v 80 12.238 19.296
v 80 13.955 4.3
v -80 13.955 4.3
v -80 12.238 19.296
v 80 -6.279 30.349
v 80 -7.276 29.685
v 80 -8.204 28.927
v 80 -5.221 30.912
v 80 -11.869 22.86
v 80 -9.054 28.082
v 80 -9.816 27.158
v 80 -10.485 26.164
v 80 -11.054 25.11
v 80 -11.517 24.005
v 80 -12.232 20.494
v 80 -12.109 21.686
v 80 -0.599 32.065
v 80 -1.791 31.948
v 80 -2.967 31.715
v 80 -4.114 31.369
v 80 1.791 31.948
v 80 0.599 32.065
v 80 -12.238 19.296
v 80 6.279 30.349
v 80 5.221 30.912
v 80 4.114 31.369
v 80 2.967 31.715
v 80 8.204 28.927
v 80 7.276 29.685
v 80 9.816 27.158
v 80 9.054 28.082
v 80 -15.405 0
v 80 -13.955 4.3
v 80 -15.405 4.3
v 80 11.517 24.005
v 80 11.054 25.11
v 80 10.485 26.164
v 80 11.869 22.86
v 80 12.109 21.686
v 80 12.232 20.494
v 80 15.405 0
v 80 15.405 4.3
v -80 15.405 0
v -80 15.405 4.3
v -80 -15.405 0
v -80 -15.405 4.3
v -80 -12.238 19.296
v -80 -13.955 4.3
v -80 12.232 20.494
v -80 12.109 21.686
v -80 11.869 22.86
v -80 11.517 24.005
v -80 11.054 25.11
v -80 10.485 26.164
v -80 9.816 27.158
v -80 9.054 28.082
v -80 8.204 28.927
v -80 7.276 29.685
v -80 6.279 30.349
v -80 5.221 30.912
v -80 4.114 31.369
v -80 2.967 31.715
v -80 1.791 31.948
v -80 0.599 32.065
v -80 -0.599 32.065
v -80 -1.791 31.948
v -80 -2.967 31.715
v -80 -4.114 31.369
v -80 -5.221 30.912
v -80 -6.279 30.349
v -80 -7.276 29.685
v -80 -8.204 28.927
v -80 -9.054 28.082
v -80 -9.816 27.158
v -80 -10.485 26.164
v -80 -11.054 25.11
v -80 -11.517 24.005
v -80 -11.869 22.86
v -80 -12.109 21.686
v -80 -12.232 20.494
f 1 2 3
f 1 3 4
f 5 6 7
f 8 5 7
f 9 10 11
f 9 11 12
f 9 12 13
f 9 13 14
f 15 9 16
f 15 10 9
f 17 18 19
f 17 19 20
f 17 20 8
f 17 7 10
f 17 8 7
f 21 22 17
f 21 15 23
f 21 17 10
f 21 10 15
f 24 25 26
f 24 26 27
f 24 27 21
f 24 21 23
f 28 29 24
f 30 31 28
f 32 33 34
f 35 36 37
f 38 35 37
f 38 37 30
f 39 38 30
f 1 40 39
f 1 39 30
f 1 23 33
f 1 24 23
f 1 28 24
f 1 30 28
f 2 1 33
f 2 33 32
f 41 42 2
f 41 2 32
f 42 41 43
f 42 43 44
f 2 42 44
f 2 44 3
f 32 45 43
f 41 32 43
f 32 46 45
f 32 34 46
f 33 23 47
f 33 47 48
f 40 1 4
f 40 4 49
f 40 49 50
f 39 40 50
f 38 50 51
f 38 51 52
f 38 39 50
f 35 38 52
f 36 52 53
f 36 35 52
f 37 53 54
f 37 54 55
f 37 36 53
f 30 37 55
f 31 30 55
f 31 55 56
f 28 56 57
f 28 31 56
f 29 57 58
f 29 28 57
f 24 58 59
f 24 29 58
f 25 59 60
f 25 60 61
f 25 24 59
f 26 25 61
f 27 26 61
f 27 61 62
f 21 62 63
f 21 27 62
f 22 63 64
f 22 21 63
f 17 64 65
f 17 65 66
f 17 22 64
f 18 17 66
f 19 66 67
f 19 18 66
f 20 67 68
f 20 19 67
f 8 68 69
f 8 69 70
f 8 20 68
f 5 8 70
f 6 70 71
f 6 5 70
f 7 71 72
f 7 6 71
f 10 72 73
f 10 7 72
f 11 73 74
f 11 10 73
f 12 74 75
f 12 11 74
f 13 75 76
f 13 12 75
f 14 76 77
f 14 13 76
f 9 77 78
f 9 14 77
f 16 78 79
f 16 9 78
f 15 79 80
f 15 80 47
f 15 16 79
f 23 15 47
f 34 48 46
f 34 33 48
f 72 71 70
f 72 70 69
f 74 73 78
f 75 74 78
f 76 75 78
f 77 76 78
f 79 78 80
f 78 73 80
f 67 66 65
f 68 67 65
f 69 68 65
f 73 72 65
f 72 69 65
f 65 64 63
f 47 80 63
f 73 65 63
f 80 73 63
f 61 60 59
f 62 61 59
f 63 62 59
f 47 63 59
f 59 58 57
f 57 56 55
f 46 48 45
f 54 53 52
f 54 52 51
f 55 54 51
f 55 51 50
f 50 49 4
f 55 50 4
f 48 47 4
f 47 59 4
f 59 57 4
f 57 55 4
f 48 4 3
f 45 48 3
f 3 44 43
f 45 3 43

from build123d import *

# Parameters (mm, degrees)
BOSS_EXTRUDE1_DEPTH = 80


with BuildPart() as part:
    # Sketch1 → Boss-Extrude1 (new, symmetric)
    with BuildSketch(Plane(origin=(0, 0, 0), x_dir=(0, 0, -1), z_dir=(1, 0, 0))):
        with BuildLine():
            Line((0, -15.405), (0, 15.405))
            Line((0, 15.405), (-4.3, 15.405))
            Line((-4.3, 15.405), (-4.3, 13.955))
            Line((-4.3, 13.955), (-19.295662505, 12.238340714))
            ThreePointArc((-19.295662505, 12.238340714), (-32.08, 0), (-19.295662505, -12.238340714))
            Line((-19.295662505, -12.238340714), (-4.3, -13.955))
            Line((-4.3, -13.955), (-4.3, -15.405))
            Line((-4.3, -15.405), (0, -15.405))
        make_face()
    extrude(amount=BOSS_EXTRUDE1_DEPTH, both=True)


solid = part.part
